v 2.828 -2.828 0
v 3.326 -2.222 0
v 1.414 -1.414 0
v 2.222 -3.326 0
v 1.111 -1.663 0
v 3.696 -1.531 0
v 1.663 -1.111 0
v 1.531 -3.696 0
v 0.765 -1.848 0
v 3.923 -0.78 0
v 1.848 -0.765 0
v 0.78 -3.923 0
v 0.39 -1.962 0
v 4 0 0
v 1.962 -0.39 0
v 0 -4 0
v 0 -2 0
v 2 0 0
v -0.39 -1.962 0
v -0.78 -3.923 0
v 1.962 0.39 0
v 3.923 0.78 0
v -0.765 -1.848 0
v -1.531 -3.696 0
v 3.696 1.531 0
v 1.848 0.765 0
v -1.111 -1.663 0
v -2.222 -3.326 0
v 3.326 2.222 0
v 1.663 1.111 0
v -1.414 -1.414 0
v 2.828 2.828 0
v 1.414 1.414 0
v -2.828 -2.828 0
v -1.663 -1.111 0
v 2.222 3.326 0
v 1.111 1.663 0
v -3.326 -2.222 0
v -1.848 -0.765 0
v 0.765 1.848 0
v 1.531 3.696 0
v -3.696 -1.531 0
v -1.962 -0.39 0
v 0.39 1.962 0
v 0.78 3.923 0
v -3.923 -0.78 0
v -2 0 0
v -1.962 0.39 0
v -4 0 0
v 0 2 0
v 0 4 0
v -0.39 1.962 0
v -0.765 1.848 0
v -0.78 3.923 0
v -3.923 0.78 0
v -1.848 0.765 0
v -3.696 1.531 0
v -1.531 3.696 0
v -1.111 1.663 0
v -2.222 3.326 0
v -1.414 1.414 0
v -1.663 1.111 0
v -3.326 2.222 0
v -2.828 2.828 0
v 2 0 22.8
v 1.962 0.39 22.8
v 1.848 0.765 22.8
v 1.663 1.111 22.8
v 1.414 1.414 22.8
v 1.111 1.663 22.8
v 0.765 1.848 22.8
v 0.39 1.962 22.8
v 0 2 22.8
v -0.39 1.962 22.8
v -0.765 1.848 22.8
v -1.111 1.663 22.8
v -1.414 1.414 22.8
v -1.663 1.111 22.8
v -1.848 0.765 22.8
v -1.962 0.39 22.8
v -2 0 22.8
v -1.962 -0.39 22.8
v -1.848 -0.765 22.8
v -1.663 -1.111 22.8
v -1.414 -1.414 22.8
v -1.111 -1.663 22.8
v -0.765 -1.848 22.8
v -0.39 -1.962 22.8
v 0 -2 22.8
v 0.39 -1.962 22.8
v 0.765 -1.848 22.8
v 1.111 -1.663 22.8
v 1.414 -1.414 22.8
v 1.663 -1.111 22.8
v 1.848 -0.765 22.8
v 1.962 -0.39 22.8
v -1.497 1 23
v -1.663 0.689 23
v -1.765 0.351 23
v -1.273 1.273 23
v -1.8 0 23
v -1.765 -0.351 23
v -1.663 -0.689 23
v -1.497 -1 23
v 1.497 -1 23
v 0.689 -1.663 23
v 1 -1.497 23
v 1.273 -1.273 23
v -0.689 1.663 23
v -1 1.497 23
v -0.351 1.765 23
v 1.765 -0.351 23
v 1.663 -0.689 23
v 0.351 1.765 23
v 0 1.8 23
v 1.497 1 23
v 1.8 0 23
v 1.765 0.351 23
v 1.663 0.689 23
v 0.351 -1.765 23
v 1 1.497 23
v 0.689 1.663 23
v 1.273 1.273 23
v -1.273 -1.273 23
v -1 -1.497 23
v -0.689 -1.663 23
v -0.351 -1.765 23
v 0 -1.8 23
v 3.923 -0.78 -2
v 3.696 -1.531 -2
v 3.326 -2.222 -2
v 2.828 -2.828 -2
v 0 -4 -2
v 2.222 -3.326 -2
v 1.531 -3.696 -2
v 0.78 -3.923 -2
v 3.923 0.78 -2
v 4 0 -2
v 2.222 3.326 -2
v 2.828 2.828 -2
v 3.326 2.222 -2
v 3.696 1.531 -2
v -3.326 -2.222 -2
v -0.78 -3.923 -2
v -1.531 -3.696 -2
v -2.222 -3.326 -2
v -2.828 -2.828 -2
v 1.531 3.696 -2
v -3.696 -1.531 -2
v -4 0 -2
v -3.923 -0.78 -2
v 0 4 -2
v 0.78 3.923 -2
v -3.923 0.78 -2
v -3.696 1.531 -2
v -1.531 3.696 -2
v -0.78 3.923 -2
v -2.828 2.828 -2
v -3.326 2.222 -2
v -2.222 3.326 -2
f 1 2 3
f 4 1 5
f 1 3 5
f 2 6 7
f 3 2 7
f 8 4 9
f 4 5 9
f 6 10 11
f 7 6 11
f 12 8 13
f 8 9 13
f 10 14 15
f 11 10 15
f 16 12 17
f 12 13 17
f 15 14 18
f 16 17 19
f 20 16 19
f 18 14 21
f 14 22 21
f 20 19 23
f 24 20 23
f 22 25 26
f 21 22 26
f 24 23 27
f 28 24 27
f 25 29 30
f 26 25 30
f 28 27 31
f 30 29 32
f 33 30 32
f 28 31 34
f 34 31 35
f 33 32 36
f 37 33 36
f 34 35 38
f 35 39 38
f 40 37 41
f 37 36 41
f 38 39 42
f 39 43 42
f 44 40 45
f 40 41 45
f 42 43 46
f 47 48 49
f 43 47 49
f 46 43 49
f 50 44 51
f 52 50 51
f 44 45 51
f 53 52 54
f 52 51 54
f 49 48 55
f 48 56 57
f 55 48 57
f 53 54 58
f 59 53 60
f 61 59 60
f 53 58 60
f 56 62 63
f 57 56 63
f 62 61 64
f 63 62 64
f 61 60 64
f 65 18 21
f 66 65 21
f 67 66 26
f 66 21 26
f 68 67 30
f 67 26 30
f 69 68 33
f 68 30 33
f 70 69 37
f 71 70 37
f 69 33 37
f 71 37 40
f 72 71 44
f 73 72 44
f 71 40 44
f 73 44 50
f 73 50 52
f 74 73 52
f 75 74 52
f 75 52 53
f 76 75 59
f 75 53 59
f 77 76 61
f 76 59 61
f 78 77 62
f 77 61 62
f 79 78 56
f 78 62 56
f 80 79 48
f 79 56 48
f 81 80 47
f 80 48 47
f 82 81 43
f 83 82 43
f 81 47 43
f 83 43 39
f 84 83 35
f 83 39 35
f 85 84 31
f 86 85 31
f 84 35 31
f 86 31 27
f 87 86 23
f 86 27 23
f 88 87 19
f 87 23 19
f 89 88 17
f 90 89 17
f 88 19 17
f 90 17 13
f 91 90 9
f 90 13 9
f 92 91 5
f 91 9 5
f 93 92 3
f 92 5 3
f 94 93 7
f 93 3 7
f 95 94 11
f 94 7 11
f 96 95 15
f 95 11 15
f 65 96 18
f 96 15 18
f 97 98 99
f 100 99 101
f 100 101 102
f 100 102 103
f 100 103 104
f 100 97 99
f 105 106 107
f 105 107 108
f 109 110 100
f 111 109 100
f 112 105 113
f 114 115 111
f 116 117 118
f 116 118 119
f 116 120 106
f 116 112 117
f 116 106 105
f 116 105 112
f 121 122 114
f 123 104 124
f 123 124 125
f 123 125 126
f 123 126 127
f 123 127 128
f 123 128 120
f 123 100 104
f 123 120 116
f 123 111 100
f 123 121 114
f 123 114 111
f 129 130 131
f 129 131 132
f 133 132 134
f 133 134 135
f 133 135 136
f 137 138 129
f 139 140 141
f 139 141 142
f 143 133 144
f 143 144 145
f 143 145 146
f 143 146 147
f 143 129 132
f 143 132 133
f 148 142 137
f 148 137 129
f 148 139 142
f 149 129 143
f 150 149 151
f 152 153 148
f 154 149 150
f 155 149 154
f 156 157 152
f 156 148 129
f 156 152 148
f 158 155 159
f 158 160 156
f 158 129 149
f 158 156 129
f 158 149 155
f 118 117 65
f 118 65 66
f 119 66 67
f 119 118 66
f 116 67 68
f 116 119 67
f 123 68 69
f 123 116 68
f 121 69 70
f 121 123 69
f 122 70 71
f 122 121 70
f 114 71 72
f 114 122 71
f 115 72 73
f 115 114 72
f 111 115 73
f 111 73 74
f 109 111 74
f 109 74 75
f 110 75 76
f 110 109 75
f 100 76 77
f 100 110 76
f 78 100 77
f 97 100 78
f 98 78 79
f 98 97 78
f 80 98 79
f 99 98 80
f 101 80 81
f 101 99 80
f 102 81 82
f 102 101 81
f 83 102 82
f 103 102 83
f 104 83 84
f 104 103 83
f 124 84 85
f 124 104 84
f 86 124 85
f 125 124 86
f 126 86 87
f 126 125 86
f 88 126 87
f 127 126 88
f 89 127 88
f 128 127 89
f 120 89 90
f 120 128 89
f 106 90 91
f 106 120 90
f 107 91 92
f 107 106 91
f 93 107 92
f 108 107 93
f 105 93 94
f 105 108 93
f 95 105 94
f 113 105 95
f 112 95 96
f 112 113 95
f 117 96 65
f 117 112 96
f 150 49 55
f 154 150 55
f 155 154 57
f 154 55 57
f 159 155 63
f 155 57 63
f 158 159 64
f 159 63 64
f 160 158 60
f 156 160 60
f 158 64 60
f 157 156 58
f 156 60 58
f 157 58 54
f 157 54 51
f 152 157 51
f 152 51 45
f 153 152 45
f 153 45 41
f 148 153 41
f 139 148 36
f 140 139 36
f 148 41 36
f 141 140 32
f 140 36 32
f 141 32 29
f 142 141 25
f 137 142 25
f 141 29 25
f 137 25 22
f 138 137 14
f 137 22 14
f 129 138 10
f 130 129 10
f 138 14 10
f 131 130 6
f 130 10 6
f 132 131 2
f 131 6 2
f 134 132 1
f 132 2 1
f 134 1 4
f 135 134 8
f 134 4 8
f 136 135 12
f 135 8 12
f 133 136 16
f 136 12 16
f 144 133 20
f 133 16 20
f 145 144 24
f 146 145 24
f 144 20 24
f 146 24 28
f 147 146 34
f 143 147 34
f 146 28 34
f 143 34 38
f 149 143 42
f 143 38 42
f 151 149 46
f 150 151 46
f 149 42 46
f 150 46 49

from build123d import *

# Parameters (mm, degrees)
SKETCH_1_R      = 2
EXTRUDE_1_DEPTH = 23
SKETCH_2_R      = 4
EXTRUDE_2_DEPTH = 2
CHAMFER_1_SIZE  = 0.2


with BuildPart() as part:
    # 草图1 → 拉伸1 (new body)
    with BuildSketch(Plane.XY):
        Circle(SKETCH_1_R)
    extrude(amount=EXTRUDE_1_DEPTH)

    # 草图2 → 拉伸2 (add)
    with BuildSketch(Plane(origin=(0, 0, 0), x_dir=(-1, 0, 0), z_dir=(0, 0, -1))):
        Circle(SKETCH_2_R)
    extrude(amount=EXTRUDE_2_DEPTH)

    # 倒角1
    chamfer_1_edges = [part.edges().sort_by_distance(p)[0] for p in [
        (-2, 0, 23),
    ]]
    chamfer(chamfer_1_edges, length=CHAMFER_1_SIZE)


solid = part.part
